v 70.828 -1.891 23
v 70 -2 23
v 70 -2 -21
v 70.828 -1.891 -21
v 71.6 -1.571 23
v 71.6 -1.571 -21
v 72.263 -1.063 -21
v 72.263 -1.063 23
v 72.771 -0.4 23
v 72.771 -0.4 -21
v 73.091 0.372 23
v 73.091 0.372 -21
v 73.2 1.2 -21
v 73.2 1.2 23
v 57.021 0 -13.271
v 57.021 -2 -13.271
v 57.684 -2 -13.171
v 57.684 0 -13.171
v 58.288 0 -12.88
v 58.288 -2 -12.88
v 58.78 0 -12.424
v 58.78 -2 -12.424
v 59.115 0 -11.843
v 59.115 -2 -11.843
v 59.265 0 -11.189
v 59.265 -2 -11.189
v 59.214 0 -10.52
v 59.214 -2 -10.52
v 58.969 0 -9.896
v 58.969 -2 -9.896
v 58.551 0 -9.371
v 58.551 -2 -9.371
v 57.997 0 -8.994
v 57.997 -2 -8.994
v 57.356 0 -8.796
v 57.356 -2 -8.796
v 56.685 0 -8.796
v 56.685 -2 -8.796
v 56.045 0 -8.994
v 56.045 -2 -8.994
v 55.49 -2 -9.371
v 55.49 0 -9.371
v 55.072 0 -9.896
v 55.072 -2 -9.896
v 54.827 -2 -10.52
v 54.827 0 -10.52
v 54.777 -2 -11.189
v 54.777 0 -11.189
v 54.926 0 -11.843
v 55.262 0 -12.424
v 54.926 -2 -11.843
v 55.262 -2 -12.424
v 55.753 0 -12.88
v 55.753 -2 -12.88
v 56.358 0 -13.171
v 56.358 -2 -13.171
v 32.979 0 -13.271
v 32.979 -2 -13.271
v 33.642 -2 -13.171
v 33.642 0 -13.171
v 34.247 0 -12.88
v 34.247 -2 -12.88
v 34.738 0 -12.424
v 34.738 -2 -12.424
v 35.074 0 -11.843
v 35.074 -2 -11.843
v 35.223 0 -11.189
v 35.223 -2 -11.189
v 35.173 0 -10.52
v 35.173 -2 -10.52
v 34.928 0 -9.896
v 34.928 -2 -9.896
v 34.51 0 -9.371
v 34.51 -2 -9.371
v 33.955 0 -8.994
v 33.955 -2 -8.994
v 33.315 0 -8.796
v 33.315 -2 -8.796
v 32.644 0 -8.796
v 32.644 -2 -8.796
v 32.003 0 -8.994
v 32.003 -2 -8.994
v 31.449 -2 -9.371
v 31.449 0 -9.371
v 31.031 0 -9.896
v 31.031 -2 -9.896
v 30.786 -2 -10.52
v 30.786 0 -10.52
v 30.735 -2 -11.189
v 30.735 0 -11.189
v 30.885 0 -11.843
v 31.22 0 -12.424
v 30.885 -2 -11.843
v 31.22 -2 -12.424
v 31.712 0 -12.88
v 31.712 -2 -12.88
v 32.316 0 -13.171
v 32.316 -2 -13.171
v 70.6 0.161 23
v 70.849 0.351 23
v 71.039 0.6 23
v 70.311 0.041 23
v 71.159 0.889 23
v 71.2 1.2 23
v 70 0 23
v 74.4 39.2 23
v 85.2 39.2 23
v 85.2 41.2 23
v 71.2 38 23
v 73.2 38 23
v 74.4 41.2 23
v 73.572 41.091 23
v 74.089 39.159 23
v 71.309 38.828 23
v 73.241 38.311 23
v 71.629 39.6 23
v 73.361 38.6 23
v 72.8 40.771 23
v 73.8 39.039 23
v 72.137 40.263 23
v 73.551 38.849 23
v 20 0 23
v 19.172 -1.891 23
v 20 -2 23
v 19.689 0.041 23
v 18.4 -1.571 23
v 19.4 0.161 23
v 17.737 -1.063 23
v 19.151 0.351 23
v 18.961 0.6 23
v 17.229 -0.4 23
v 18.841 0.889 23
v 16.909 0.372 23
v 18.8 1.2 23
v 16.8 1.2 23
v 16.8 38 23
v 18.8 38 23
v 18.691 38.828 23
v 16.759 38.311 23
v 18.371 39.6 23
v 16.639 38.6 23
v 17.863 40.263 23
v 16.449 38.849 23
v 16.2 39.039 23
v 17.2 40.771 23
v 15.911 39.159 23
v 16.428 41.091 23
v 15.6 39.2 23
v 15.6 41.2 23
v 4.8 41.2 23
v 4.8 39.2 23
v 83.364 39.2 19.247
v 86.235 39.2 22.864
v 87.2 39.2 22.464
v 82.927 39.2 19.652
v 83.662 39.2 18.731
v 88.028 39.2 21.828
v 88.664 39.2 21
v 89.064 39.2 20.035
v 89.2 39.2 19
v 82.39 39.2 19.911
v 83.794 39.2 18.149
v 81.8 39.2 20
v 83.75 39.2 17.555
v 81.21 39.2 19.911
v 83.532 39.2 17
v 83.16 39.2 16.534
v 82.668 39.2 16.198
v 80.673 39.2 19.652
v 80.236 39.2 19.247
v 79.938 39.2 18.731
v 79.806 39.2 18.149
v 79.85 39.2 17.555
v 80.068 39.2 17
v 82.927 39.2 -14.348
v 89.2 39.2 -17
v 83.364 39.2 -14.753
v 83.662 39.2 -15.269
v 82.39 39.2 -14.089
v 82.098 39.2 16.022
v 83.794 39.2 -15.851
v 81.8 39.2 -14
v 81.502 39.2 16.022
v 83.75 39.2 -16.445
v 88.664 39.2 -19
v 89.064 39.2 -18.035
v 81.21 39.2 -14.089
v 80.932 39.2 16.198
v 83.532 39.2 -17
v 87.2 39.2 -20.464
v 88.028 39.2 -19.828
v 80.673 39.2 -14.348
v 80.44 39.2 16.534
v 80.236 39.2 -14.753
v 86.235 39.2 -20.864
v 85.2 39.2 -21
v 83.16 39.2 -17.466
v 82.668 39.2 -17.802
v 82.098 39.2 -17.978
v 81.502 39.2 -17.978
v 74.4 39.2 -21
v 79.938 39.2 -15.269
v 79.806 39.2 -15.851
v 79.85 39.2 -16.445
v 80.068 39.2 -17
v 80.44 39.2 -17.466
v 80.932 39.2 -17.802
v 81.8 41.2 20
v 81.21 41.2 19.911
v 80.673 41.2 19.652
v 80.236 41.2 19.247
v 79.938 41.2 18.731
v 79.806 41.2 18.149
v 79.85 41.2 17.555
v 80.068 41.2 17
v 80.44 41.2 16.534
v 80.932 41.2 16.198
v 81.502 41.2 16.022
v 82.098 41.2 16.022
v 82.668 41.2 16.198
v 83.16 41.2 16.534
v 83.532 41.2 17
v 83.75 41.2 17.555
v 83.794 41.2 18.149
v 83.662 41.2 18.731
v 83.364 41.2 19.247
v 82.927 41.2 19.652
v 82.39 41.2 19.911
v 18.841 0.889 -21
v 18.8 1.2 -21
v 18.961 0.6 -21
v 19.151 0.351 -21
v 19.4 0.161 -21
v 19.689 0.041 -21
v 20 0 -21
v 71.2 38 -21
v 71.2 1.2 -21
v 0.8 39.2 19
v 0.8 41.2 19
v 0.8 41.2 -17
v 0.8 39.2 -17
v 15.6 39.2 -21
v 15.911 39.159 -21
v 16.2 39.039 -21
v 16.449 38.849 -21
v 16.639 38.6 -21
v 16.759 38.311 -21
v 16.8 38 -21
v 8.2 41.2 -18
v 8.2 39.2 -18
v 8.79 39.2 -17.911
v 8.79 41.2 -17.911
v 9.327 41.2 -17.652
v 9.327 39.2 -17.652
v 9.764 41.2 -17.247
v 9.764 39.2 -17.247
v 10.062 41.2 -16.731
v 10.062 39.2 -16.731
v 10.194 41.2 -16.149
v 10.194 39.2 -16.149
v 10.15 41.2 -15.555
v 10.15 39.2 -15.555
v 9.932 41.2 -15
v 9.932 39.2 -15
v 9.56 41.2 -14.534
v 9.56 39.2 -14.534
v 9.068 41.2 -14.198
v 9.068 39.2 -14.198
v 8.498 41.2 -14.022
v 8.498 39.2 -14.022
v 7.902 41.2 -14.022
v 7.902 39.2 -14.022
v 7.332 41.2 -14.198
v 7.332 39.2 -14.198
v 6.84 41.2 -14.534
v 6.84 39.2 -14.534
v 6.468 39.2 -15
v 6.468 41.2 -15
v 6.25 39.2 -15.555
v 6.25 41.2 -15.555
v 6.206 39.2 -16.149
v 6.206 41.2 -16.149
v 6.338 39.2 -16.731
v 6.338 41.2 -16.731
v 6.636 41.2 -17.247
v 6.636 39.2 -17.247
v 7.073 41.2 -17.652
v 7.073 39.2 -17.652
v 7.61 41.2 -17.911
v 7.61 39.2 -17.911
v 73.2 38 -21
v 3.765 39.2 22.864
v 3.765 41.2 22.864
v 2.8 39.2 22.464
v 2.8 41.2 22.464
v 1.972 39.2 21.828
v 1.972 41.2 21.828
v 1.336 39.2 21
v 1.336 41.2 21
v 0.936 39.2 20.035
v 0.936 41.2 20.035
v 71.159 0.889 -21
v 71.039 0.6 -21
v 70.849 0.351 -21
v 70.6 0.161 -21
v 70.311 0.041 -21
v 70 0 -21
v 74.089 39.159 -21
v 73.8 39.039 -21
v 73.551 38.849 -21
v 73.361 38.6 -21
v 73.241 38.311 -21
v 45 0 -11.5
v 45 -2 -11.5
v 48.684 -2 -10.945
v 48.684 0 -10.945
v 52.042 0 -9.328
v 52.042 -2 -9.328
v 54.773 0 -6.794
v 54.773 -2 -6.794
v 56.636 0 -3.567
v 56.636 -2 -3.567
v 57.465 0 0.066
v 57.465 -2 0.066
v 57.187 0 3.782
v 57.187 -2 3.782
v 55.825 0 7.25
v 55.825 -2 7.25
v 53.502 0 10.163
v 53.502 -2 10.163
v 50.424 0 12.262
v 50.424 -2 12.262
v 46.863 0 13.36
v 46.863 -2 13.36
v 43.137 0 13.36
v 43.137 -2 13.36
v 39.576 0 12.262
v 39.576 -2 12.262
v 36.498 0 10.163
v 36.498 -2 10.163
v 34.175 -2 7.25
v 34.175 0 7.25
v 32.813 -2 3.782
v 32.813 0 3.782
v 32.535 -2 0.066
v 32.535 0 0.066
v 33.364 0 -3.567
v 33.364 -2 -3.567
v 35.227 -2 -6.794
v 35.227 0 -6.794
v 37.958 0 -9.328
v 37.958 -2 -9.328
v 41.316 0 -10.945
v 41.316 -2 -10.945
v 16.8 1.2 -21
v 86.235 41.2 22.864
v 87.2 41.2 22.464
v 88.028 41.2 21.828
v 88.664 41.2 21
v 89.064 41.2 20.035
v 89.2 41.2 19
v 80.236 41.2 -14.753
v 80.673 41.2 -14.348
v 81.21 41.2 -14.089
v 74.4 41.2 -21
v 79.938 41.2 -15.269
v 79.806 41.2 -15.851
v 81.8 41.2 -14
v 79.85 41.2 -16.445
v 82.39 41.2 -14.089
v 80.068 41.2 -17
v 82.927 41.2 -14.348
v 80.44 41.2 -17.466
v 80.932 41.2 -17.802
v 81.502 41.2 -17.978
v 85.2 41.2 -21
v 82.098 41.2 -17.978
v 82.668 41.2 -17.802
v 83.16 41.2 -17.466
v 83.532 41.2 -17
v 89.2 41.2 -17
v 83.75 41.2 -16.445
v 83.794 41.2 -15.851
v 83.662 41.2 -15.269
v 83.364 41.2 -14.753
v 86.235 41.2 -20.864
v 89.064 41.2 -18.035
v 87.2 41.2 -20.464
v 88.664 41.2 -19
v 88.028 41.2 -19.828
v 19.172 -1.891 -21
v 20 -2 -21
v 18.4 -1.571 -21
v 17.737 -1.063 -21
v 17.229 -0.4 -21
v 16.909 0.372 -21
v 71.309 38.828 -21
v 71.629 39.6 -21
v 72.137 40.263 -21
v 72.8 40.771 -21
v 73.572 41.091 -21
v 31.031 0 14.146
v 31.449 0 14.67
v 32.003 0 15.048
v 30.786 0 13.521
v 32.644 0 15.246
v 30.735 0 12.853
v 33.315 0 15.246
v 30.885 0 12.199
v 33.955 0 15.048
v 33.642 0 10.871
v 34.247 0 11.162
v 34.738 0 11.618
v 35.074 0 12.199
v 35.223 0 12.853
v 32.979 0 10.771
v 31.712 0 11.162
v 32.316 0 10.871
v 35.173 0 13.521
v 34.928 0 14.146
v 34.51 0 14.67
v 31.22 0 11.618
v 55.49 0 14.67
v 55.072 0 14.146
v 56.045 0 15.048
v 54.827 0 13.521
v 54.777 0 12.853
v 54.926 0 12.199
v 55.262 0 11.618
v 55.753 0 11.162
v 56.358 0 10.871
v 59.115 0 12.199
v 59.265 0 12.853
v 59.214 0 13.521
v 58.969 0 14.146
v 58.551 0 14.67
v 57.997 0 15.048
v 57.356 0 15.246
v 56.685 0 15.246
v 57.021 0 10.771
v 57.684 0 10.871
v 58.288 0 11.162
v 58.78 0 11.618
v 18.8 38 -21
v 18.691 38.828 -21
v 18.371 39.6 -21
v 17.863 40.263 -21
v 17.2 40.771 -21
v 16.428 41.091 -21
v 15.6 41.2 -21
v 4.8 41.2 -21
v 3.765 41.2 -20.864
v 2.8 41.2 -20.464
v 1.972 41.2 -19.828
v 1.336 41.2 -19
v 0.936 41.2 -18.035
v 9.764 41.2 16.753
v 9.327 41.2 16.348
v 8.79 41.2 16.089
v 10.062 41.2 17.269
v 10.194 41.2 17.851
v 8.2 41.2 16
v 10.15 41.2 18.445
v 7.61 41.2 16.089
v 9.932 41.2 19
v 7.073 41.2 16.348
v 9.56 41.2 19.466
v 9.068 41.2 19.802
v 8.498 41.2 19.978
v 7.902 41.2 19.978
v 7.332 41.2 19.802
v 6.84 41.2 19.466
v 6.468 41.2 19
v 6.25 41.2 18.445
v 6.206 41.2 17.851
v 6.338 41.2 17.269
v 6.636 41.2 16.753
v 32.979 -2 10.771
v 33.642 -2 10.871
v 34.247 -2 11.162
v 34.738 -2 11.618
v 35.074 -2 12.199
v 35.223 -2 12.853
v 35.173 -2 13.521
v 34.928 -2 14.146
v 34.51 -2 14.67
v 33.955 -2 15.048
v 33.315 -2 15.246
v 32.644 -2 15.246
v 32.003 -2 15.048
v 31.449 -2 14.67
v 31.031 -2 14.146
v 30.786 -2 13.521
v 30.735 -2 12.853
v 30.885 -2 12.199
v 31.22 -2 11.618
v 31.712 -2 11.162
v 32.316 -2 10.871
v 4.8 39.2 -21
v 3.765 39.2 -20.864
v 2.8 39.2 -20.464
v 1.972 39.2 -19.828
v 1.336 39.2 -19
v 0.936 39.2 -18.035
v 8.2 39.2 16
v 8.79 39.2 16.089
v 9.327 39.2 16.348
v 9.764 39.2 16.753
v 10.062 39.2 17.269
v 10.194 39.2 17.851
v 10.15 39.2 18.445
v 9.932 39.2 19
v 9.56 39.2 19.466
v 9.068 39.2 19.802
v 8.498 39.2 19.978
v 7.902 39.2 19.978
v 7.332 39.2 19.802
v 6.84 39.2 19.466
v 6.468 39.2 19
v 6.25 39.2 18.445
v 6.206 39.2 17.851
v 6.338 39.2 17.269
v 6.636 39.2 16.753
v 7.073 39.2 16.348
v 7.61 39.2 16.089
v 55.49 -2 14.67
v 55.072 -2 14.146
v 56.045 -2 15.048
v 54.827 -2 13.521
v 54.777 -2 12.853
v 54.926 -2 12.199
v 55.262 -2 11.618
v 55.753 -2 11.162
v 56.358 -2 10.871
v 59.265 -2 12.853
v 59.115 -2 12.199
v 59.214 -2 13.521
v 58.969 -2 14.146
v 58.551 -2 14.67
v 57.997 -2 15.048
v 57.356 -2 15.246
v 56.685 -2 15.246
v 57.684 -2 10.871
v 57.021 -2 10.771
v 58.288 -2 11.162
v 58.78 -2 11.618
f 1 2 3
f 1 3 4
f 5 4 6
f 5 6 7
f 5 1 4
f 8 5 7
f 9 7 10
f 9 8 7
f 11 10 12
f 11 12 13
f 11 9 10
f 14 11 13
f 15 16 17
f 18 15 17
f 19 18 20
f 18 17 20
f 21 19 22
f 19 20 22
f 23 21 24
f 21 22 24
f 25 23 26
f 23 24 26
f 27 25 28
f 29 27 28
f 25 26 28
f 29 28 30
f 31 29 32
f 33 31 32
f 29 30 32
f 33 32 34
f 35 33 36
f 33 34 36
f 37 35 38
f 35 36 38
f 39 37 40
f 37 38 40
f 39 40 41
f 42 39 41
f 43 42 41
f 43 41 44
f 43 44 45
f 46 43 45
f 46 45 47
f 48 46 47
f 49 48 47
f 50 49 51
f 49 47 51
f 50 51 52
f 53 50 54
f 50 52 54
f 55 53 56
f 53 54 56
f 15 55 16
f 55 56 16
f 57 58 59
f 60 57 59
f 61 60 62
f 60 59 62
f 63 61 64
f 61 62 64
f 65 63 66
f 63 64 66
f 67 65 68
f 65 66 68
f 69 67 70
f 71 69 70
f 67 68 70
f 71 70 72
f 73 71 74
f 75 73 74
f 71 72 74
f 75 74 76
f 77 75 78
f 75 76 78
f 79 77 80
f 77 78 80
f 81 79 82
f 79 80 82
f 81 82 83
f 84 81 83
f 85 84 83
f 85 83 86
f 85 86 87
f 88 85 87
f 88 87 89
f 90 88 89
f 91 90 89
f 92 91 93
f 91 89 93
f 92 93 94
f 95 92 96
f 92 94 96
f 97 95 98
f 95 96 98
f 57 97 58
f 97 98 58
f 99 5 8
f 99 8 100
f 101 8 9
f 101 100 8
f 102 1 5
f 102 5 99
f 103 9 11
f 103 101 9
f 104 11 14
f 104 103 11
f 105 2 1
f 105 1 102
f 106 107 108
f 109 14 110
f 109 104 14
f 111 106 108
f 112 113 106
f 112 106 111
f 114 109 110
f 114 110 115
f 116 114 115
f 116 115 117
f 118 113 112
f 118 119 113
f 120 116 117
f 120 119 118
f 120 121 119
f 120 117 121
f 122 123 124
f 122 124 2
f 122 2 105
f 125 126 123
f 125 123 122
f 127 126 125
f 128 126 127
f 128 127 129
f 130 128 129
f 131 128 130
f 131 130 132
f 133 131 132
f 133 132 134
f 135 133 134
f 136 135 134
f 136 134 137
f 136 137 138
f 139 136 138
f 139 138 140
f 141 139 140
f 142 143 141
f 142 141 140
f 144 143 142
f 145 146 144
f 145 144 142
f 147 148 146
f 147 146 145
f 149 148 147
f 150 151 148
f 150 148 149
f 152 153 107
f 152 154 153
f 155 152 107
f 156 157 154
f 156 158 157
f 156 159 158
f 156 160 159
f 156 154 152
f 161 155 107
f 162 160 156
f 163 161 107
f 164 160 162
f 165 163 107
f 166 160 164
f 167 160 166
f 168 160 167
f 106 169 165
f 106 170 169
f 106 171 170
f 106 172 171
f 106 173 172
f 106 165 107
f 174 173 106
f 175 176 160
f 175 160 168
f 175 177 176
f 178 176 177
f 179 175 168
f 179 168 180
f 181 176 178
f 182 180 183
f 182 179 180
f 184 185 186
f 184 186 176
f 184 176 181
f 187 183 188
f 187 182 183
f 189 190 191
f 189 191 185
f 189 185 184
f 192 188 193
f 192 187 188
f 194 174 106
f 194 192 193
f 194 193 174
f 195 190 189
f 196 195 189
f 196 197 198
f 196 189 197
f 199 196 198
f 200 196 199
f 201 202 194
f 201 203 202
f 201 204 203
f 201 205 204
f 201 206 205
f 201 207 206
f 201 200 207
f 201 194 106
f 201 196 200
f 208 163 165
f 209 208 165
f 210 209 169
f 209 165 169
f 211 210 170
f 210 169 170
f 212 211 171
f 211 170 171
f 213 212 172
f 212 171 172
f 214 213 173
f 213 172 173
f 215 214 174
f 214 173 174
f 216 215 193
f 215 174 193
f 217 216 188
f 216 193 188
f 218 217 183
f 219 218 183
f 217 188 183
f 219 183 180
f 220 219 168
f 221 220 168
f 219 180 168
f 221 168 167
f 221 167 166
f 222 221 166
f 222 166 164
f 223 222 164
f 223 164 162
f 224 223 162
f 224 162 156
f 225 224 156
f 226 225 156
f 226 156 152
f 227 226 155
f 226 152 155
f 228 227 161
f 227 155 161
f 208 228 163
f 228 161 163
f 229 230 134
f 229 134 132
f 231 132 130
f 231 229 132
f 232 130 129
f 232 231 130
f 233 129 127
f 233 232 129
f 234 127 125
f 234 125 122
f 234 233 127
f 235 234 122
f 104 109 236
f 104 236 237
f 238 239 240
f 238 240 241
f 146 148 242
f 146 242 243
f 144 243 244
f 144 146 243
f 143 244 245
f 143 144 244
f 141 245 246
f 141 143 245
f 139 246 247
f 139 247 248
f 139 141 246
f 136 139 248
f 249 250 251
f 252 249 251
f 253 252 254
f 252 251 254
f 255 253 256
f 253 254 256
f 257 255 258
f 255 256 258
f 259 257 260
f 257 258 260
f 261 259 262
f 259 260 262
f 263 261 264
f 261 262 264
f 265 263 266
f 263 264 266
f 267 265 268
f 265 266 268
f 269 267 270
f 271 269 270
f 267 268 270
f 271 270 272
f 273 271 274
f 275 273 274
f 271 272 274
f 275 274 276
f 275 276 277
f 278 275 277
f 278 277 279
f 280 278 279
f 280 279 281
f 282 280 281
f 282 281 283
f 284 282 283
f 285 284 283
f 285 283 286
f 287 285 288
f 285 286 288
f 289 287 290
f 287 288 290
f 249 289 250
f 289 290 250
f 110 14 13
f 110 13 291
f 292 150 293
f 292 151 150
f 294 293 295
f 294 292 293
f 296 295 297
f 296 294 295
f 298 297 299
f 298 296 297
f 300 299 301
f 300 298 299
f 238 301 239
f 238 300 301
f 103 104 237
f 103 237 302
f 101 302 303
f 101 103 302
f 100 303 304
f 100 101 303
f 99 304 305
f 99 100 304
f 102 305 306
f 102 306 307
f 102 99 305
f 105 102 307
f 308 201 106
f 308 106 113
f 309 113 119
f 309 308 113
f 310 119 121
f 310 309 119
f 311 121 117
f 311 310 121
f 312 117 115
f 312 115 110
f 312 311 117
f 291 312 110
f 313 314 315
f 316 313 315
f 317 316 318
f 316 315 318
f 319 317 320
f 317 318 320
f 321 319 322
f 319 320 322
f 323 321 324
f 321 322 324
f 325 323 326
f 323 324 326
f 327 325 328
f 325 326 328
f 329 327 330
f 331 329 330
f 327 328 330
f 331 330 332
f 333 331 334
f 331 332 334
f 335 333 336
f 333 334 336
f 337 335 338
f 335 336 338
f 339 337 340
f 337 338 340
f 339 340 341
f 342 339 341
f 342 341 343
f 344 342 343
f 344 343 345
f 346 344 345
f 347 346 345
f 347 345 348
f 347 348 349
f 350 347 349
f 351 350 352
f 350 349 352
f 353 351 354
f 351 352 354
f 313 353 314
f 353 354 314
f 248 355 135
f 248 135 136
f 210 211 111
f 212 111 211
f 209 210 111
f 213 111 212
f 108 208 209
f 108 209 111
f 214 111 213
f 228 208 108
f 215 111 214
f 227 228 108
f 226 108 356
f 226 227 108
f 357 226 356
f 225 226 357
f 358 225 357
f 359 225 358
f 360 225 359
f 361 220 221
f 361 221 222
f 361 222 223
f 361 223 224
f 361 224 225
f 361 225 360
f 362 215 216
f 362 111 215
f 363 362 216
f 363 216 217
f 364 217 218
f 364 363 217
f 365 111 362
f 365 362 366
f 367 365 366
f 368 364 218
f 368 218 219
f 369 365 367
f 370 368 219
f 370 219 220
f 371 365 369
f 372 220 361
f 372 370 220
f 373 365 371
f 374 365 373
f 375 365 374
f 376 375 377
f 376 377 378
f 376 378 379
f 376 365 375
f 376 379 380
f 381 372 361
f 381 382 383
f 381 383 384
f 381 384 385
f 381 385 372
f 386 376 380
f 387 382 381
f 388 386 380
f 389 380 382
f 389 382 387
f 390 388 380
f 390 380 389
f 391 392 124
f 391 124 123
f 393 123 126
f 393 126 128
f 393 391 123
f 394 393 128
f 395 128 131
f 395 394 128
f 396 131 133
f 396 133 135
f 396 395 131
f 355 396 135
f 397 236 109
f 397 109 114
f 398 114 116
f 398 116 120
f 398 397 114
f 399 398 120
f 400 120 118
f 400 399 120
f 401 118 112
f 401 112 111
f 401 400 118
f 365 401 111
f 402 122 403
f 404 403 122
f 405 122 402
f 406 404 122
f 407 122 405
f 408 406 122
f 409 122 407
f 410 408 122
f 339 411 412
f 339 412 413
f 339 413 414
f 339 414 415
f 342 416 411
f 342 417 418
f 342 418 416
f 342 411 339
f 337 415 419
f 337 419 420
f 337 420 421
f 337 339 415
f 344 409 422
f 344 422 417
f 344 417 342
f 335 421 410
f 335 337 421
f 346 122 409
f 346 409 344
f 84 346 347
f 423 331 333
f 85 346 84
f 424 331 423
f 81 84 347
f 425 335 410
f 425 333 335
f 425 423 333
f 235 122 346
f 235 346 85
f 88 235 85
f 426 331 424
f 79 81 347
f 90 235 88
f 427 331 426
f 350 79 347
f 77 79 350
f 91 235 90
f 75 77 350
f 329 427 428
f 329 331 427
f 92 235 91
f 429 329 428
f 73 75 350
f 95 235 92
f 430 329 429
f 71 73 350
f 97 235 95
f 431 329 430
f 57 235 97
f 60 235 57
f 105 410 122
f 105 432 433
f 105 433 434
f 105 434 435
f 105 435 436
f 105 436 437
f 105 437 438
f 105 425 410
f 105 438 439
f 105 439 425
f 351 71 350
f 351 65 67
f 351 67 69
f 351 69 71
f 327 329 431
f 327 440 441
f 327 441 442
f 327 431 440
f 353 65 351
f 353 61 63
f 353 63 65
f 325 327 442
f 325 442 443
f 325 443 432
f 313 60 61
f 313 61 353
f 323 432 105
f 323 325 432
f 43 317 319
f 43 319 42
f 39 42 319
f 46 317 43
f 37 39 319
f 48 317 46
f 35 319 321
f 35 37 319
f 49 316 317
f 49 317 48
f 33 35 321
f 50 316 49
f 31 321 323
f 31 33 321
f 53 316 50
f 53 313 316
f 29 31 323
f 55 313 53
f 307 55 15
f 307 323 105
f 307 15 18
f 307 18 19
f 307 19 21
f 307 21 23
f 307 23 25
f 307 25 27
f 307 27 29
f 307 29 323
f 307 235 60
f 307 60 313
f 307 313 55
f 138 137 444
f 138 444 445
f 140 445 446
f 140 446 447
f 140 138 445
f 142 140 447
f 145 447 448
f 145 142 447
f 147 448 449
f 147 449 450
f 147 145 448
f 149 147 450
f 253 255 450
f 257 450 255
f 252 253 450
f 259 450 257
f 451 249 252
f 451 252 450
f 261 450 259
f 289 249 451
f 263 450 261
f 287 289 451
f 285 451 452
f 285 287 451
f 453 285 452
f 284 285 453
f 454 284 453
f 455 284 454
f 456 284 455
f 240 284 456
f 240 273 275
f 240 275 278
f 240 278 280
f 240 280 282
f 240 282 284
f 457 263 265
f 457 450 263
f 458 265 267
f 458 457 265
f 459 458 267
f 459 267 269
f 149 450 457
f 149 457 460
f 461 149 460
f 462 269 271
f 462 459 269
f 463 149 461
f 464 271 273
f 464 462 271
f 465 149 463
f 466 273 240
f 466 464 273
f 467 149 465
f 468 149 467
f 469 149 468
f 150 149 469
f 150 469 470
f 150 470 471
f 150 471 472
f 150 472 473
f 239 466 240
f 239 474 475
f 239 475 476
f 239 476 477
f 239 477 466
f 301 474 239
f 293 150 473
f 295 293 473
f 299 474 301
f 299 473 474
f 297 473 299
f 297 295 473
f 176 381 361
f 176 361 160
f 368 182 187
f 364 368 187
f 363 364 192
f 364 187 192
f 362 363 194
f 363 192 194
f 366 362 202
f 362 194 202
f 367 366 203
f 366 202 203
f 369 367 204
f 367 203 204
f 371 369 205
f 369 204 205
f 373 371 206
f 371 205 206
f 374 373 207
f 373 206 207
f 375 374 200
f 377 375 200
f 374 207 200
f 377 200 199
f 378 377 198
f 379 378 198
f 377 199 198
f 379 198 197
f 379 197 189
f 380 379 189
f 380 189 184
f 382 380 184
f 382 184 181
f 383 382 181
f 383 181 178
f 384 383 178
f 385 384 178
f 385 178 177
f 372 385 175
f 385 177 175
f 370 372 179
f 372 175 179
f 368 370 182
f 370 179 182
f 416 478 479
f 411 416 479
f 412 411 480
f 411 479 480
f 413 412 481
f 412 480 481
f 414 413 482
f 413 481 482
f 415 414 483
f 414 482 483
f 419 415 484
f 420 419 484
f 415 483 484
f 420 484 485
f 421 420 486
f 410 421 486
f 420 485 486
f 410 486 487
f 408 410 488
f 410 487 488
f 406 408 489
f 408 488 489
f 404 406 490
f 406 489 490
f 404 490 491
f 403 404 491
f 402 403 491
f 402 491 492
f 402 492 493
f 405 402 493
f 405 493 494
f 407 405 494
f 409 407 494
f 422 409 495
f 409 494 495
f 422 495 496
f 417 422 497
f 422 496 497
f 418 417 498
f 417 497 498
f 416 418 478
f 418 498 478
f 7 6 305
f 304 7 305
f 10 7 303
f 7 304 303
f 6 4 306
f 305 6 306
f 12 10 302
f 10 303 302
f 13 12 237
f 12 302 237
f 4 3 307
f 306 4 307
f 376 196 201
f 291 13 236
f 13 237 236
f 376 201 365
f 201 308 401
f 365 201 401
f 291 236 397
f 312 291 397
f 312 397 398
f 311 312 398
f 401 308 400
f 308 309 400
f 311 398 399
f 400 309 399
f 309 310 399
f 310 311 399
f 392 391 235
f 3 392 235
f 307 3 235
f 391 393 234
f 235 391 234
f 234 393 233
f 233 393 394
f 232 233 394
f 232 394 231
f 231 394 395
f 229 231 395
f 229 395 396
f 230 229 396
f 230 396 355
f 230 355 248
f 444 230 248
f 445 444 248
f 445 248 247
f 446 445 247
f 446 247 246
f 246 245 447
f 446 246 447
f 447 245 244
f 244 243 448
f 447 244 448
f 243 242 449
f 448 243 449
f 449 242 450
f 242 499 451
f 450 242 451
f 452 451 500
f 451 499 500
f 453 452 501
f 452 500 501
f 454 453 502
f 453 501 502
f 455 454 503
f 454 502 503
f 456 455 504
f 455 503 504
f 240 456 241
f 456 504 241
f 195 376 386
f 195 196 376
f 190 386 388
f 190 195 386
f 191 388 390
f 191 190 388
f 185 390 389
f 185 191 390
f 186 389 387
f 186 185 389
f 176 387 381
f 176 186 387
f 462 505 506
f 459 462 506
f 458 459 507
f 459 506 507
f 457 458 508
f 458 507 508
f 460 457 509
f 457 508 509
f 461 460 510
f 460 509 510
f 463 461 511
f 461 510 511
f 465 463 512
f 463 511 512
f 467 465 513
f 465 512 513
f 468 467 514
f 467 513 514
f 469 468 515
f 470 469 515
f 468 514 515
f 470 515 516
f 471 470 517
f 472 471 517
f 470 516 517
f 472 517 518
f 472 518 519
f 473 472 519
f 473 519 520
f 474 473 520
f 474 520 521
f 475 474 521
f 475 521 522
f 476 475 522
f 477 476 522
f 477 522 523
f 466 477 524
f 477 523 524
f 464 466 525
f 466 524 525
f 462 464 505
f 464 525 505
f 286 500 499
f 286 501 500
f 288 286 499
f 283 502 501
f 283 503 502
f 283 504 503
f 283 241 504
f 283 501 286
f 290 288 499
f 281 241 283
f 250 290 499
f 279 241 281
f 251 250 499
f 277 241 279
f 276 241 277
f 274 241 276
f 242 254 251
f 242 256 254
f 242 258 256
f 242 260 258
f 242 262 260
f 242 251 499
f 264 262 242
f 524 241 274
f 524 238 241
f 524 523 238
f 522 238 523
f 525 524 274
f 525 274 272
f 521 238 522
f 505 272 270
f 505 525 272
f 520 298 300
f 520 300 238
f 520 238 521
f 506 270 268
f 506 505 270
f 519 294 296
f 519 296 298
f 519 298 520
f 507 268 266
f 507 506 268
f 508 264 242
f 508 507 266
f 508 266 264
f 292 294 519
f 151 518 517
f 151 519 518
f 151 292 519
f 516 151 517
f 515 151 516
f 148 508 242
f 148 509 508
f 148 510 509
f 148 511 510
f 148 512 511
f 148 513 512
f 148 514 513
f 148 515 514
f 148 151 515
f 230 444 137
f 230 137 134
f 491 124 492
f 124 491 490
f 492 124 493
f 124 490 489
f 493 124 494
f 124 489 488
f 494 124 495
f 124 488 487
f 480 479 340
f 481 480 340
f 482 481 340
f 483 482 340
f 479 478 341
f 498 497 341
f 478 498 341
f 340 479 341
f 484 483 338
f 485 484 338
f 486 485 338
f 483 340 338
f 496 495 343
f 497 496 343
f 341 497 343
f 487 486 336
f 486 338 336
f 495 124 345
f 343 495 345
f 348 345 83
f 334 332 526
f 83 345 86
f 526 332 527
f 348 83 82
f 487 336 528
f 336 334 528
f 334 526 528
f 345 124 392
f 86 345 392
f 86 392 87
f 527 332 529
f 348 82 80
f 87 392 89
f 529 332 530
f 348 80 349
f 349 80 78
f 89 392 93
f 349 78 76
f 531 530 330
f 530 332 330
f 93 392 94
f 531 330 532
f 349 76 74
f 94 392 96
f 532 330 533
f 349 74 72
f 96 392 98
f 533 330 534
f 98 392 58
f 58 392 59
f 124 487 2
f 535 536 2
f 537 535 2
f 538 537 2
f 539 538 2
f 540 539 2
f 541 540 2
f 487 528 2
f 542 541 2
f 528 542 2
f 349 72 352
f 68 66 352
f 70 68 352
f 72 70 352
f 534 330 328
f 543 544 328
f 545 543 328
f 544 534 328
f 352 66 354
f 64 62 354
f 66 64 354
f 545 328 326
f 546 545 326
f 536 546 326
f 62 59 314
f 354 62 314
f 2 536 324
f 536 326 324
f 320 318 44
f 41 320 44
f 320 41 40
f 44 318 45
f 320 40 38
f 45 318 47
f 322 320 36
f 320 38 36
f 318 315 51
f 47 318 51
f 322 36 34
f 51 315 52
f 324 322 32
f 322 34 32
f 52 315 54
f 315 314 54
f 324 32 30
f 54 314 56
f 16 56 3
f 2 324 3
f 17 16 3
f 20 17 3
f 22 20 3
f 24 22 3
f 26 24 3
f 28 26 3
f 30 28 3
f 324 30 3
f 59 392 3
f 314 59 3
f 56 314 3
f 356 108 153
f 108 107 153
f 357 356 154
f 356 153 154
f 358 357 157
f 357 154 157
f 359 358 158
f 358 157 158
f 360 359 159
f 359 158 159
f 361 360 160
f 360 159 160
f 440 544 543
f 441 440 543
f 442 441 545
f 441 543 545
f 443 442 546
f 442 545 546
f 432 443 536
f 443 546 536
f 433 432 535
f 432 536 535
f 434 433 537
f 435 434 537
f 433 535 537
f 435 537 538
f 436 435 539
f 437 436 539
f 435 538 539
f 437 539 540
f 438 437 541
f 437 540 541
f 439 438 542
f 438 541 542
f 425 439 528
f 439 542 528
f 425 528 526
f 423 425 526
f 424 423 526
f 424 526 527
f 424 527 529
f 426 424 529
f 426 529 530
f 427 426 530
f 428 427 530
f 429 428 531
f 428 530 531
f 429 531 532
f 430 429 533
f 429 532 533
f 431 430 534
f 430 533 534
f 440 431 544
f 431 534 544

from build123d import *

# Parameters (mm, degrees)
SKETCH1_W               = 50
SKETCH1_H               = 44
BASE_FLANGE1_DEPTH      = 2
EDGE_FLANGE1_DEPTH      = 44
EDGE_FLANGE1_BEND_DEPTH = 44
EDGE_FLANGE2_DEPTH      = 44
EDGE_FLANGE2_BEND_DEPTH = 44
SKETCH21_R              = 12.5
SKETCH21_R_2            = 2.25
CUT_EXTRUDE1_DEPTH      = 2
SKETCH22_R              = 2
CUT_EXTRUDE2_DEPTH      = 2
FILLET1_R               = 4


# Sheet-metal steps are written as plain solids
with BuildPart() as part:
    # Sketch1 → Base-Flange1 (new body)
    with BuildSketch(Plane(origin=(0, 0, 0), x_dir=(1, 0, 0), z_dir=(0, 1, 0))):
        with Locations((45, -1)):
            Rectangle(SKETCH1_W, SKETCH1_H)
    extrude(amount=-BASE_FLANGE1_DEPTH)

    # Edge-Flange1 section (across the edge) → Edge-Flange1 (add)
    with BuildSketch(Plane(origin=(18.8, 0, -21), x_dir=(1, 0, 0), z_dir=(0, 0, 1))):
        with BuildLine():
            Line((-2, 1.2), (-2, 38))
            Line((-2, 38), (0, 38))
            Line((0, 38), (0, 1.2))
            ThreePointArc((0, 1.2), (0.351471863, 0.351471863), (1.2, 0))
            Line((1.2, 0), (1.2, -2))
            ThreePointArc((1.2, -2), (-1.0627417, -1.0627417), (-2, 1.2))
        make_face()
    extrude(amount=EDGE_FLANGE1_DEPTH)

    # Edge-Flange1 section 2 (across the edge) → Edge-Flange1 bend (add)
    with BuildSketch(Plane(origin=(71.2, 0, 23), x_dir=(-1, 0, 0), z_dir=(0, 0, -1))):
        with BuildLine():
            Line((-2, 1.2), (-2, 38))
            Line((-2, 38), (0, 38))
            Line((0, 38), (0, 1.2))
            ThreePointArc((0, 1.2), (0.351471863, 0.351471863), (1.2, 0))
            Line((1.2, 0), (1.2, -2))
            ThreePointArc((1.2, -2), (-1.0627417, -1.0627417), (-2, 1.2))
        make_face()
    extrude(amount=EDGE_FLANGE1_BEND_DEPTH)

    # Edge-Flange2 section (across the edge) → Edge-Flange2 (add)
    with BuildSketch(Plane(origin=(73.2, 39.2, -21), x_dir=(0, -1, 0), z_dir=(0, 0, 1))):
        with BuildLine():
            Line((-2, 1.2), (-2, 16))
            Line((-2, 16), (0, 16))
            Line((0, 16), (0, 1.2))
            ThreePointArc((0, 1.2), (0.351471863, 0.351471863), (1.2, 0))
            Line((1.2, 0), (1.2, -2))
            ThreePointArc((1.2, -2), (-1.0627417, -1.0627417), (-2, 1.2))
        make_face()
    extrude(amount=EDGE_FLANGE2_DEPTH)

    # Edge-Flange2 section 2 (across the edge) → Edge-Flange2 bend (add)
    with BuildSketch(Plane(origin=(16.8, 39.2, 23), x_dir=(0, -1, 0), z_dir=(0, 0, -1))):
        with BuildLine():
            Line((-2, 1.2), (-2, 16))
            Line((-2, 16), (0, 16))
            Line((0, 16), (0, 1.2))
            ThreePointArc((0, 1.2), (0.351471863, 0.351471863), (1.2, 0))
            Line((1.2, 0), (1.2, -2))
            ThreePointArc((1.2, -2), (-1.0627417, -1.0627417), (-2, 1.2))
        make_face()
    extrude(amount=EDGE_FLANGE2_BEND_DEPTH)

    # Sketch21 → Cut-Extrude1 (cut)
    with BuildSketch(Plane.XZ.offset(2)):
        with Locations(Location((45, 1, 0), (0, 0, 270))):
            Circle(SKETCH21_R)
        with Locations(Location((57.02081528, 13.02081528, 0), (0, 0, 270))):
            Circle(SKETCH21_R_2)
        with Locations(Location((57.02081528, -11.02081528, 0), (0, 0, 270))):
            Circle(SKETCH21_R_2)
        with Locations(Location((32.97918472, -11.02081528, 0), (0, 0, 270))):
            Circle(SKETCH21_R_2)
        with Locations(Location((32.97918472, 13.02081528, 0), (0, 0, 270))):
            Circle(SKETCH21_R_2)
    extrude(amount=-CUT_EXTRUDE1_DEPTH, mode=Mode.SUBTRACT)

    # Sketch22 → Cut-Extrude2 (cut)
    with BuildSketch(Plane.XZ.offset(-39.2)):
        with Locations(Location((8.2, 18, 0), (0, 0, 270))):
            Circle(SKETCH22_R)
        with Locations(Location((8.2, -16, 0), (0, 0, 270))):
            Circle(SKETCH22_R)
        with Locations(Location((81.8, -16, 0), (0, 0, 90))):
            Circle(SKETCH22_R)
        with Locations(Location((81.8, 18, 0), (0, 0, 90))):
            Circle(SKETCH22_R)
    extrude(amount=-CUT_EXTRUDE2_DEPTH, mode=Mode.SUBTRACT)

    # Fillet1
    fillet1_edges = [part.edges().sort_by_distance(p)[0] for p in [
        (89.2, 40.2, -21),
        (89.2, 40.2, 23),
        (0.8, 40.2, 23),
        (0.8, 40.2, -21),
    ]]
    fillet(fillet1_edges, radius=FILLET1_R)


solid = part.part
